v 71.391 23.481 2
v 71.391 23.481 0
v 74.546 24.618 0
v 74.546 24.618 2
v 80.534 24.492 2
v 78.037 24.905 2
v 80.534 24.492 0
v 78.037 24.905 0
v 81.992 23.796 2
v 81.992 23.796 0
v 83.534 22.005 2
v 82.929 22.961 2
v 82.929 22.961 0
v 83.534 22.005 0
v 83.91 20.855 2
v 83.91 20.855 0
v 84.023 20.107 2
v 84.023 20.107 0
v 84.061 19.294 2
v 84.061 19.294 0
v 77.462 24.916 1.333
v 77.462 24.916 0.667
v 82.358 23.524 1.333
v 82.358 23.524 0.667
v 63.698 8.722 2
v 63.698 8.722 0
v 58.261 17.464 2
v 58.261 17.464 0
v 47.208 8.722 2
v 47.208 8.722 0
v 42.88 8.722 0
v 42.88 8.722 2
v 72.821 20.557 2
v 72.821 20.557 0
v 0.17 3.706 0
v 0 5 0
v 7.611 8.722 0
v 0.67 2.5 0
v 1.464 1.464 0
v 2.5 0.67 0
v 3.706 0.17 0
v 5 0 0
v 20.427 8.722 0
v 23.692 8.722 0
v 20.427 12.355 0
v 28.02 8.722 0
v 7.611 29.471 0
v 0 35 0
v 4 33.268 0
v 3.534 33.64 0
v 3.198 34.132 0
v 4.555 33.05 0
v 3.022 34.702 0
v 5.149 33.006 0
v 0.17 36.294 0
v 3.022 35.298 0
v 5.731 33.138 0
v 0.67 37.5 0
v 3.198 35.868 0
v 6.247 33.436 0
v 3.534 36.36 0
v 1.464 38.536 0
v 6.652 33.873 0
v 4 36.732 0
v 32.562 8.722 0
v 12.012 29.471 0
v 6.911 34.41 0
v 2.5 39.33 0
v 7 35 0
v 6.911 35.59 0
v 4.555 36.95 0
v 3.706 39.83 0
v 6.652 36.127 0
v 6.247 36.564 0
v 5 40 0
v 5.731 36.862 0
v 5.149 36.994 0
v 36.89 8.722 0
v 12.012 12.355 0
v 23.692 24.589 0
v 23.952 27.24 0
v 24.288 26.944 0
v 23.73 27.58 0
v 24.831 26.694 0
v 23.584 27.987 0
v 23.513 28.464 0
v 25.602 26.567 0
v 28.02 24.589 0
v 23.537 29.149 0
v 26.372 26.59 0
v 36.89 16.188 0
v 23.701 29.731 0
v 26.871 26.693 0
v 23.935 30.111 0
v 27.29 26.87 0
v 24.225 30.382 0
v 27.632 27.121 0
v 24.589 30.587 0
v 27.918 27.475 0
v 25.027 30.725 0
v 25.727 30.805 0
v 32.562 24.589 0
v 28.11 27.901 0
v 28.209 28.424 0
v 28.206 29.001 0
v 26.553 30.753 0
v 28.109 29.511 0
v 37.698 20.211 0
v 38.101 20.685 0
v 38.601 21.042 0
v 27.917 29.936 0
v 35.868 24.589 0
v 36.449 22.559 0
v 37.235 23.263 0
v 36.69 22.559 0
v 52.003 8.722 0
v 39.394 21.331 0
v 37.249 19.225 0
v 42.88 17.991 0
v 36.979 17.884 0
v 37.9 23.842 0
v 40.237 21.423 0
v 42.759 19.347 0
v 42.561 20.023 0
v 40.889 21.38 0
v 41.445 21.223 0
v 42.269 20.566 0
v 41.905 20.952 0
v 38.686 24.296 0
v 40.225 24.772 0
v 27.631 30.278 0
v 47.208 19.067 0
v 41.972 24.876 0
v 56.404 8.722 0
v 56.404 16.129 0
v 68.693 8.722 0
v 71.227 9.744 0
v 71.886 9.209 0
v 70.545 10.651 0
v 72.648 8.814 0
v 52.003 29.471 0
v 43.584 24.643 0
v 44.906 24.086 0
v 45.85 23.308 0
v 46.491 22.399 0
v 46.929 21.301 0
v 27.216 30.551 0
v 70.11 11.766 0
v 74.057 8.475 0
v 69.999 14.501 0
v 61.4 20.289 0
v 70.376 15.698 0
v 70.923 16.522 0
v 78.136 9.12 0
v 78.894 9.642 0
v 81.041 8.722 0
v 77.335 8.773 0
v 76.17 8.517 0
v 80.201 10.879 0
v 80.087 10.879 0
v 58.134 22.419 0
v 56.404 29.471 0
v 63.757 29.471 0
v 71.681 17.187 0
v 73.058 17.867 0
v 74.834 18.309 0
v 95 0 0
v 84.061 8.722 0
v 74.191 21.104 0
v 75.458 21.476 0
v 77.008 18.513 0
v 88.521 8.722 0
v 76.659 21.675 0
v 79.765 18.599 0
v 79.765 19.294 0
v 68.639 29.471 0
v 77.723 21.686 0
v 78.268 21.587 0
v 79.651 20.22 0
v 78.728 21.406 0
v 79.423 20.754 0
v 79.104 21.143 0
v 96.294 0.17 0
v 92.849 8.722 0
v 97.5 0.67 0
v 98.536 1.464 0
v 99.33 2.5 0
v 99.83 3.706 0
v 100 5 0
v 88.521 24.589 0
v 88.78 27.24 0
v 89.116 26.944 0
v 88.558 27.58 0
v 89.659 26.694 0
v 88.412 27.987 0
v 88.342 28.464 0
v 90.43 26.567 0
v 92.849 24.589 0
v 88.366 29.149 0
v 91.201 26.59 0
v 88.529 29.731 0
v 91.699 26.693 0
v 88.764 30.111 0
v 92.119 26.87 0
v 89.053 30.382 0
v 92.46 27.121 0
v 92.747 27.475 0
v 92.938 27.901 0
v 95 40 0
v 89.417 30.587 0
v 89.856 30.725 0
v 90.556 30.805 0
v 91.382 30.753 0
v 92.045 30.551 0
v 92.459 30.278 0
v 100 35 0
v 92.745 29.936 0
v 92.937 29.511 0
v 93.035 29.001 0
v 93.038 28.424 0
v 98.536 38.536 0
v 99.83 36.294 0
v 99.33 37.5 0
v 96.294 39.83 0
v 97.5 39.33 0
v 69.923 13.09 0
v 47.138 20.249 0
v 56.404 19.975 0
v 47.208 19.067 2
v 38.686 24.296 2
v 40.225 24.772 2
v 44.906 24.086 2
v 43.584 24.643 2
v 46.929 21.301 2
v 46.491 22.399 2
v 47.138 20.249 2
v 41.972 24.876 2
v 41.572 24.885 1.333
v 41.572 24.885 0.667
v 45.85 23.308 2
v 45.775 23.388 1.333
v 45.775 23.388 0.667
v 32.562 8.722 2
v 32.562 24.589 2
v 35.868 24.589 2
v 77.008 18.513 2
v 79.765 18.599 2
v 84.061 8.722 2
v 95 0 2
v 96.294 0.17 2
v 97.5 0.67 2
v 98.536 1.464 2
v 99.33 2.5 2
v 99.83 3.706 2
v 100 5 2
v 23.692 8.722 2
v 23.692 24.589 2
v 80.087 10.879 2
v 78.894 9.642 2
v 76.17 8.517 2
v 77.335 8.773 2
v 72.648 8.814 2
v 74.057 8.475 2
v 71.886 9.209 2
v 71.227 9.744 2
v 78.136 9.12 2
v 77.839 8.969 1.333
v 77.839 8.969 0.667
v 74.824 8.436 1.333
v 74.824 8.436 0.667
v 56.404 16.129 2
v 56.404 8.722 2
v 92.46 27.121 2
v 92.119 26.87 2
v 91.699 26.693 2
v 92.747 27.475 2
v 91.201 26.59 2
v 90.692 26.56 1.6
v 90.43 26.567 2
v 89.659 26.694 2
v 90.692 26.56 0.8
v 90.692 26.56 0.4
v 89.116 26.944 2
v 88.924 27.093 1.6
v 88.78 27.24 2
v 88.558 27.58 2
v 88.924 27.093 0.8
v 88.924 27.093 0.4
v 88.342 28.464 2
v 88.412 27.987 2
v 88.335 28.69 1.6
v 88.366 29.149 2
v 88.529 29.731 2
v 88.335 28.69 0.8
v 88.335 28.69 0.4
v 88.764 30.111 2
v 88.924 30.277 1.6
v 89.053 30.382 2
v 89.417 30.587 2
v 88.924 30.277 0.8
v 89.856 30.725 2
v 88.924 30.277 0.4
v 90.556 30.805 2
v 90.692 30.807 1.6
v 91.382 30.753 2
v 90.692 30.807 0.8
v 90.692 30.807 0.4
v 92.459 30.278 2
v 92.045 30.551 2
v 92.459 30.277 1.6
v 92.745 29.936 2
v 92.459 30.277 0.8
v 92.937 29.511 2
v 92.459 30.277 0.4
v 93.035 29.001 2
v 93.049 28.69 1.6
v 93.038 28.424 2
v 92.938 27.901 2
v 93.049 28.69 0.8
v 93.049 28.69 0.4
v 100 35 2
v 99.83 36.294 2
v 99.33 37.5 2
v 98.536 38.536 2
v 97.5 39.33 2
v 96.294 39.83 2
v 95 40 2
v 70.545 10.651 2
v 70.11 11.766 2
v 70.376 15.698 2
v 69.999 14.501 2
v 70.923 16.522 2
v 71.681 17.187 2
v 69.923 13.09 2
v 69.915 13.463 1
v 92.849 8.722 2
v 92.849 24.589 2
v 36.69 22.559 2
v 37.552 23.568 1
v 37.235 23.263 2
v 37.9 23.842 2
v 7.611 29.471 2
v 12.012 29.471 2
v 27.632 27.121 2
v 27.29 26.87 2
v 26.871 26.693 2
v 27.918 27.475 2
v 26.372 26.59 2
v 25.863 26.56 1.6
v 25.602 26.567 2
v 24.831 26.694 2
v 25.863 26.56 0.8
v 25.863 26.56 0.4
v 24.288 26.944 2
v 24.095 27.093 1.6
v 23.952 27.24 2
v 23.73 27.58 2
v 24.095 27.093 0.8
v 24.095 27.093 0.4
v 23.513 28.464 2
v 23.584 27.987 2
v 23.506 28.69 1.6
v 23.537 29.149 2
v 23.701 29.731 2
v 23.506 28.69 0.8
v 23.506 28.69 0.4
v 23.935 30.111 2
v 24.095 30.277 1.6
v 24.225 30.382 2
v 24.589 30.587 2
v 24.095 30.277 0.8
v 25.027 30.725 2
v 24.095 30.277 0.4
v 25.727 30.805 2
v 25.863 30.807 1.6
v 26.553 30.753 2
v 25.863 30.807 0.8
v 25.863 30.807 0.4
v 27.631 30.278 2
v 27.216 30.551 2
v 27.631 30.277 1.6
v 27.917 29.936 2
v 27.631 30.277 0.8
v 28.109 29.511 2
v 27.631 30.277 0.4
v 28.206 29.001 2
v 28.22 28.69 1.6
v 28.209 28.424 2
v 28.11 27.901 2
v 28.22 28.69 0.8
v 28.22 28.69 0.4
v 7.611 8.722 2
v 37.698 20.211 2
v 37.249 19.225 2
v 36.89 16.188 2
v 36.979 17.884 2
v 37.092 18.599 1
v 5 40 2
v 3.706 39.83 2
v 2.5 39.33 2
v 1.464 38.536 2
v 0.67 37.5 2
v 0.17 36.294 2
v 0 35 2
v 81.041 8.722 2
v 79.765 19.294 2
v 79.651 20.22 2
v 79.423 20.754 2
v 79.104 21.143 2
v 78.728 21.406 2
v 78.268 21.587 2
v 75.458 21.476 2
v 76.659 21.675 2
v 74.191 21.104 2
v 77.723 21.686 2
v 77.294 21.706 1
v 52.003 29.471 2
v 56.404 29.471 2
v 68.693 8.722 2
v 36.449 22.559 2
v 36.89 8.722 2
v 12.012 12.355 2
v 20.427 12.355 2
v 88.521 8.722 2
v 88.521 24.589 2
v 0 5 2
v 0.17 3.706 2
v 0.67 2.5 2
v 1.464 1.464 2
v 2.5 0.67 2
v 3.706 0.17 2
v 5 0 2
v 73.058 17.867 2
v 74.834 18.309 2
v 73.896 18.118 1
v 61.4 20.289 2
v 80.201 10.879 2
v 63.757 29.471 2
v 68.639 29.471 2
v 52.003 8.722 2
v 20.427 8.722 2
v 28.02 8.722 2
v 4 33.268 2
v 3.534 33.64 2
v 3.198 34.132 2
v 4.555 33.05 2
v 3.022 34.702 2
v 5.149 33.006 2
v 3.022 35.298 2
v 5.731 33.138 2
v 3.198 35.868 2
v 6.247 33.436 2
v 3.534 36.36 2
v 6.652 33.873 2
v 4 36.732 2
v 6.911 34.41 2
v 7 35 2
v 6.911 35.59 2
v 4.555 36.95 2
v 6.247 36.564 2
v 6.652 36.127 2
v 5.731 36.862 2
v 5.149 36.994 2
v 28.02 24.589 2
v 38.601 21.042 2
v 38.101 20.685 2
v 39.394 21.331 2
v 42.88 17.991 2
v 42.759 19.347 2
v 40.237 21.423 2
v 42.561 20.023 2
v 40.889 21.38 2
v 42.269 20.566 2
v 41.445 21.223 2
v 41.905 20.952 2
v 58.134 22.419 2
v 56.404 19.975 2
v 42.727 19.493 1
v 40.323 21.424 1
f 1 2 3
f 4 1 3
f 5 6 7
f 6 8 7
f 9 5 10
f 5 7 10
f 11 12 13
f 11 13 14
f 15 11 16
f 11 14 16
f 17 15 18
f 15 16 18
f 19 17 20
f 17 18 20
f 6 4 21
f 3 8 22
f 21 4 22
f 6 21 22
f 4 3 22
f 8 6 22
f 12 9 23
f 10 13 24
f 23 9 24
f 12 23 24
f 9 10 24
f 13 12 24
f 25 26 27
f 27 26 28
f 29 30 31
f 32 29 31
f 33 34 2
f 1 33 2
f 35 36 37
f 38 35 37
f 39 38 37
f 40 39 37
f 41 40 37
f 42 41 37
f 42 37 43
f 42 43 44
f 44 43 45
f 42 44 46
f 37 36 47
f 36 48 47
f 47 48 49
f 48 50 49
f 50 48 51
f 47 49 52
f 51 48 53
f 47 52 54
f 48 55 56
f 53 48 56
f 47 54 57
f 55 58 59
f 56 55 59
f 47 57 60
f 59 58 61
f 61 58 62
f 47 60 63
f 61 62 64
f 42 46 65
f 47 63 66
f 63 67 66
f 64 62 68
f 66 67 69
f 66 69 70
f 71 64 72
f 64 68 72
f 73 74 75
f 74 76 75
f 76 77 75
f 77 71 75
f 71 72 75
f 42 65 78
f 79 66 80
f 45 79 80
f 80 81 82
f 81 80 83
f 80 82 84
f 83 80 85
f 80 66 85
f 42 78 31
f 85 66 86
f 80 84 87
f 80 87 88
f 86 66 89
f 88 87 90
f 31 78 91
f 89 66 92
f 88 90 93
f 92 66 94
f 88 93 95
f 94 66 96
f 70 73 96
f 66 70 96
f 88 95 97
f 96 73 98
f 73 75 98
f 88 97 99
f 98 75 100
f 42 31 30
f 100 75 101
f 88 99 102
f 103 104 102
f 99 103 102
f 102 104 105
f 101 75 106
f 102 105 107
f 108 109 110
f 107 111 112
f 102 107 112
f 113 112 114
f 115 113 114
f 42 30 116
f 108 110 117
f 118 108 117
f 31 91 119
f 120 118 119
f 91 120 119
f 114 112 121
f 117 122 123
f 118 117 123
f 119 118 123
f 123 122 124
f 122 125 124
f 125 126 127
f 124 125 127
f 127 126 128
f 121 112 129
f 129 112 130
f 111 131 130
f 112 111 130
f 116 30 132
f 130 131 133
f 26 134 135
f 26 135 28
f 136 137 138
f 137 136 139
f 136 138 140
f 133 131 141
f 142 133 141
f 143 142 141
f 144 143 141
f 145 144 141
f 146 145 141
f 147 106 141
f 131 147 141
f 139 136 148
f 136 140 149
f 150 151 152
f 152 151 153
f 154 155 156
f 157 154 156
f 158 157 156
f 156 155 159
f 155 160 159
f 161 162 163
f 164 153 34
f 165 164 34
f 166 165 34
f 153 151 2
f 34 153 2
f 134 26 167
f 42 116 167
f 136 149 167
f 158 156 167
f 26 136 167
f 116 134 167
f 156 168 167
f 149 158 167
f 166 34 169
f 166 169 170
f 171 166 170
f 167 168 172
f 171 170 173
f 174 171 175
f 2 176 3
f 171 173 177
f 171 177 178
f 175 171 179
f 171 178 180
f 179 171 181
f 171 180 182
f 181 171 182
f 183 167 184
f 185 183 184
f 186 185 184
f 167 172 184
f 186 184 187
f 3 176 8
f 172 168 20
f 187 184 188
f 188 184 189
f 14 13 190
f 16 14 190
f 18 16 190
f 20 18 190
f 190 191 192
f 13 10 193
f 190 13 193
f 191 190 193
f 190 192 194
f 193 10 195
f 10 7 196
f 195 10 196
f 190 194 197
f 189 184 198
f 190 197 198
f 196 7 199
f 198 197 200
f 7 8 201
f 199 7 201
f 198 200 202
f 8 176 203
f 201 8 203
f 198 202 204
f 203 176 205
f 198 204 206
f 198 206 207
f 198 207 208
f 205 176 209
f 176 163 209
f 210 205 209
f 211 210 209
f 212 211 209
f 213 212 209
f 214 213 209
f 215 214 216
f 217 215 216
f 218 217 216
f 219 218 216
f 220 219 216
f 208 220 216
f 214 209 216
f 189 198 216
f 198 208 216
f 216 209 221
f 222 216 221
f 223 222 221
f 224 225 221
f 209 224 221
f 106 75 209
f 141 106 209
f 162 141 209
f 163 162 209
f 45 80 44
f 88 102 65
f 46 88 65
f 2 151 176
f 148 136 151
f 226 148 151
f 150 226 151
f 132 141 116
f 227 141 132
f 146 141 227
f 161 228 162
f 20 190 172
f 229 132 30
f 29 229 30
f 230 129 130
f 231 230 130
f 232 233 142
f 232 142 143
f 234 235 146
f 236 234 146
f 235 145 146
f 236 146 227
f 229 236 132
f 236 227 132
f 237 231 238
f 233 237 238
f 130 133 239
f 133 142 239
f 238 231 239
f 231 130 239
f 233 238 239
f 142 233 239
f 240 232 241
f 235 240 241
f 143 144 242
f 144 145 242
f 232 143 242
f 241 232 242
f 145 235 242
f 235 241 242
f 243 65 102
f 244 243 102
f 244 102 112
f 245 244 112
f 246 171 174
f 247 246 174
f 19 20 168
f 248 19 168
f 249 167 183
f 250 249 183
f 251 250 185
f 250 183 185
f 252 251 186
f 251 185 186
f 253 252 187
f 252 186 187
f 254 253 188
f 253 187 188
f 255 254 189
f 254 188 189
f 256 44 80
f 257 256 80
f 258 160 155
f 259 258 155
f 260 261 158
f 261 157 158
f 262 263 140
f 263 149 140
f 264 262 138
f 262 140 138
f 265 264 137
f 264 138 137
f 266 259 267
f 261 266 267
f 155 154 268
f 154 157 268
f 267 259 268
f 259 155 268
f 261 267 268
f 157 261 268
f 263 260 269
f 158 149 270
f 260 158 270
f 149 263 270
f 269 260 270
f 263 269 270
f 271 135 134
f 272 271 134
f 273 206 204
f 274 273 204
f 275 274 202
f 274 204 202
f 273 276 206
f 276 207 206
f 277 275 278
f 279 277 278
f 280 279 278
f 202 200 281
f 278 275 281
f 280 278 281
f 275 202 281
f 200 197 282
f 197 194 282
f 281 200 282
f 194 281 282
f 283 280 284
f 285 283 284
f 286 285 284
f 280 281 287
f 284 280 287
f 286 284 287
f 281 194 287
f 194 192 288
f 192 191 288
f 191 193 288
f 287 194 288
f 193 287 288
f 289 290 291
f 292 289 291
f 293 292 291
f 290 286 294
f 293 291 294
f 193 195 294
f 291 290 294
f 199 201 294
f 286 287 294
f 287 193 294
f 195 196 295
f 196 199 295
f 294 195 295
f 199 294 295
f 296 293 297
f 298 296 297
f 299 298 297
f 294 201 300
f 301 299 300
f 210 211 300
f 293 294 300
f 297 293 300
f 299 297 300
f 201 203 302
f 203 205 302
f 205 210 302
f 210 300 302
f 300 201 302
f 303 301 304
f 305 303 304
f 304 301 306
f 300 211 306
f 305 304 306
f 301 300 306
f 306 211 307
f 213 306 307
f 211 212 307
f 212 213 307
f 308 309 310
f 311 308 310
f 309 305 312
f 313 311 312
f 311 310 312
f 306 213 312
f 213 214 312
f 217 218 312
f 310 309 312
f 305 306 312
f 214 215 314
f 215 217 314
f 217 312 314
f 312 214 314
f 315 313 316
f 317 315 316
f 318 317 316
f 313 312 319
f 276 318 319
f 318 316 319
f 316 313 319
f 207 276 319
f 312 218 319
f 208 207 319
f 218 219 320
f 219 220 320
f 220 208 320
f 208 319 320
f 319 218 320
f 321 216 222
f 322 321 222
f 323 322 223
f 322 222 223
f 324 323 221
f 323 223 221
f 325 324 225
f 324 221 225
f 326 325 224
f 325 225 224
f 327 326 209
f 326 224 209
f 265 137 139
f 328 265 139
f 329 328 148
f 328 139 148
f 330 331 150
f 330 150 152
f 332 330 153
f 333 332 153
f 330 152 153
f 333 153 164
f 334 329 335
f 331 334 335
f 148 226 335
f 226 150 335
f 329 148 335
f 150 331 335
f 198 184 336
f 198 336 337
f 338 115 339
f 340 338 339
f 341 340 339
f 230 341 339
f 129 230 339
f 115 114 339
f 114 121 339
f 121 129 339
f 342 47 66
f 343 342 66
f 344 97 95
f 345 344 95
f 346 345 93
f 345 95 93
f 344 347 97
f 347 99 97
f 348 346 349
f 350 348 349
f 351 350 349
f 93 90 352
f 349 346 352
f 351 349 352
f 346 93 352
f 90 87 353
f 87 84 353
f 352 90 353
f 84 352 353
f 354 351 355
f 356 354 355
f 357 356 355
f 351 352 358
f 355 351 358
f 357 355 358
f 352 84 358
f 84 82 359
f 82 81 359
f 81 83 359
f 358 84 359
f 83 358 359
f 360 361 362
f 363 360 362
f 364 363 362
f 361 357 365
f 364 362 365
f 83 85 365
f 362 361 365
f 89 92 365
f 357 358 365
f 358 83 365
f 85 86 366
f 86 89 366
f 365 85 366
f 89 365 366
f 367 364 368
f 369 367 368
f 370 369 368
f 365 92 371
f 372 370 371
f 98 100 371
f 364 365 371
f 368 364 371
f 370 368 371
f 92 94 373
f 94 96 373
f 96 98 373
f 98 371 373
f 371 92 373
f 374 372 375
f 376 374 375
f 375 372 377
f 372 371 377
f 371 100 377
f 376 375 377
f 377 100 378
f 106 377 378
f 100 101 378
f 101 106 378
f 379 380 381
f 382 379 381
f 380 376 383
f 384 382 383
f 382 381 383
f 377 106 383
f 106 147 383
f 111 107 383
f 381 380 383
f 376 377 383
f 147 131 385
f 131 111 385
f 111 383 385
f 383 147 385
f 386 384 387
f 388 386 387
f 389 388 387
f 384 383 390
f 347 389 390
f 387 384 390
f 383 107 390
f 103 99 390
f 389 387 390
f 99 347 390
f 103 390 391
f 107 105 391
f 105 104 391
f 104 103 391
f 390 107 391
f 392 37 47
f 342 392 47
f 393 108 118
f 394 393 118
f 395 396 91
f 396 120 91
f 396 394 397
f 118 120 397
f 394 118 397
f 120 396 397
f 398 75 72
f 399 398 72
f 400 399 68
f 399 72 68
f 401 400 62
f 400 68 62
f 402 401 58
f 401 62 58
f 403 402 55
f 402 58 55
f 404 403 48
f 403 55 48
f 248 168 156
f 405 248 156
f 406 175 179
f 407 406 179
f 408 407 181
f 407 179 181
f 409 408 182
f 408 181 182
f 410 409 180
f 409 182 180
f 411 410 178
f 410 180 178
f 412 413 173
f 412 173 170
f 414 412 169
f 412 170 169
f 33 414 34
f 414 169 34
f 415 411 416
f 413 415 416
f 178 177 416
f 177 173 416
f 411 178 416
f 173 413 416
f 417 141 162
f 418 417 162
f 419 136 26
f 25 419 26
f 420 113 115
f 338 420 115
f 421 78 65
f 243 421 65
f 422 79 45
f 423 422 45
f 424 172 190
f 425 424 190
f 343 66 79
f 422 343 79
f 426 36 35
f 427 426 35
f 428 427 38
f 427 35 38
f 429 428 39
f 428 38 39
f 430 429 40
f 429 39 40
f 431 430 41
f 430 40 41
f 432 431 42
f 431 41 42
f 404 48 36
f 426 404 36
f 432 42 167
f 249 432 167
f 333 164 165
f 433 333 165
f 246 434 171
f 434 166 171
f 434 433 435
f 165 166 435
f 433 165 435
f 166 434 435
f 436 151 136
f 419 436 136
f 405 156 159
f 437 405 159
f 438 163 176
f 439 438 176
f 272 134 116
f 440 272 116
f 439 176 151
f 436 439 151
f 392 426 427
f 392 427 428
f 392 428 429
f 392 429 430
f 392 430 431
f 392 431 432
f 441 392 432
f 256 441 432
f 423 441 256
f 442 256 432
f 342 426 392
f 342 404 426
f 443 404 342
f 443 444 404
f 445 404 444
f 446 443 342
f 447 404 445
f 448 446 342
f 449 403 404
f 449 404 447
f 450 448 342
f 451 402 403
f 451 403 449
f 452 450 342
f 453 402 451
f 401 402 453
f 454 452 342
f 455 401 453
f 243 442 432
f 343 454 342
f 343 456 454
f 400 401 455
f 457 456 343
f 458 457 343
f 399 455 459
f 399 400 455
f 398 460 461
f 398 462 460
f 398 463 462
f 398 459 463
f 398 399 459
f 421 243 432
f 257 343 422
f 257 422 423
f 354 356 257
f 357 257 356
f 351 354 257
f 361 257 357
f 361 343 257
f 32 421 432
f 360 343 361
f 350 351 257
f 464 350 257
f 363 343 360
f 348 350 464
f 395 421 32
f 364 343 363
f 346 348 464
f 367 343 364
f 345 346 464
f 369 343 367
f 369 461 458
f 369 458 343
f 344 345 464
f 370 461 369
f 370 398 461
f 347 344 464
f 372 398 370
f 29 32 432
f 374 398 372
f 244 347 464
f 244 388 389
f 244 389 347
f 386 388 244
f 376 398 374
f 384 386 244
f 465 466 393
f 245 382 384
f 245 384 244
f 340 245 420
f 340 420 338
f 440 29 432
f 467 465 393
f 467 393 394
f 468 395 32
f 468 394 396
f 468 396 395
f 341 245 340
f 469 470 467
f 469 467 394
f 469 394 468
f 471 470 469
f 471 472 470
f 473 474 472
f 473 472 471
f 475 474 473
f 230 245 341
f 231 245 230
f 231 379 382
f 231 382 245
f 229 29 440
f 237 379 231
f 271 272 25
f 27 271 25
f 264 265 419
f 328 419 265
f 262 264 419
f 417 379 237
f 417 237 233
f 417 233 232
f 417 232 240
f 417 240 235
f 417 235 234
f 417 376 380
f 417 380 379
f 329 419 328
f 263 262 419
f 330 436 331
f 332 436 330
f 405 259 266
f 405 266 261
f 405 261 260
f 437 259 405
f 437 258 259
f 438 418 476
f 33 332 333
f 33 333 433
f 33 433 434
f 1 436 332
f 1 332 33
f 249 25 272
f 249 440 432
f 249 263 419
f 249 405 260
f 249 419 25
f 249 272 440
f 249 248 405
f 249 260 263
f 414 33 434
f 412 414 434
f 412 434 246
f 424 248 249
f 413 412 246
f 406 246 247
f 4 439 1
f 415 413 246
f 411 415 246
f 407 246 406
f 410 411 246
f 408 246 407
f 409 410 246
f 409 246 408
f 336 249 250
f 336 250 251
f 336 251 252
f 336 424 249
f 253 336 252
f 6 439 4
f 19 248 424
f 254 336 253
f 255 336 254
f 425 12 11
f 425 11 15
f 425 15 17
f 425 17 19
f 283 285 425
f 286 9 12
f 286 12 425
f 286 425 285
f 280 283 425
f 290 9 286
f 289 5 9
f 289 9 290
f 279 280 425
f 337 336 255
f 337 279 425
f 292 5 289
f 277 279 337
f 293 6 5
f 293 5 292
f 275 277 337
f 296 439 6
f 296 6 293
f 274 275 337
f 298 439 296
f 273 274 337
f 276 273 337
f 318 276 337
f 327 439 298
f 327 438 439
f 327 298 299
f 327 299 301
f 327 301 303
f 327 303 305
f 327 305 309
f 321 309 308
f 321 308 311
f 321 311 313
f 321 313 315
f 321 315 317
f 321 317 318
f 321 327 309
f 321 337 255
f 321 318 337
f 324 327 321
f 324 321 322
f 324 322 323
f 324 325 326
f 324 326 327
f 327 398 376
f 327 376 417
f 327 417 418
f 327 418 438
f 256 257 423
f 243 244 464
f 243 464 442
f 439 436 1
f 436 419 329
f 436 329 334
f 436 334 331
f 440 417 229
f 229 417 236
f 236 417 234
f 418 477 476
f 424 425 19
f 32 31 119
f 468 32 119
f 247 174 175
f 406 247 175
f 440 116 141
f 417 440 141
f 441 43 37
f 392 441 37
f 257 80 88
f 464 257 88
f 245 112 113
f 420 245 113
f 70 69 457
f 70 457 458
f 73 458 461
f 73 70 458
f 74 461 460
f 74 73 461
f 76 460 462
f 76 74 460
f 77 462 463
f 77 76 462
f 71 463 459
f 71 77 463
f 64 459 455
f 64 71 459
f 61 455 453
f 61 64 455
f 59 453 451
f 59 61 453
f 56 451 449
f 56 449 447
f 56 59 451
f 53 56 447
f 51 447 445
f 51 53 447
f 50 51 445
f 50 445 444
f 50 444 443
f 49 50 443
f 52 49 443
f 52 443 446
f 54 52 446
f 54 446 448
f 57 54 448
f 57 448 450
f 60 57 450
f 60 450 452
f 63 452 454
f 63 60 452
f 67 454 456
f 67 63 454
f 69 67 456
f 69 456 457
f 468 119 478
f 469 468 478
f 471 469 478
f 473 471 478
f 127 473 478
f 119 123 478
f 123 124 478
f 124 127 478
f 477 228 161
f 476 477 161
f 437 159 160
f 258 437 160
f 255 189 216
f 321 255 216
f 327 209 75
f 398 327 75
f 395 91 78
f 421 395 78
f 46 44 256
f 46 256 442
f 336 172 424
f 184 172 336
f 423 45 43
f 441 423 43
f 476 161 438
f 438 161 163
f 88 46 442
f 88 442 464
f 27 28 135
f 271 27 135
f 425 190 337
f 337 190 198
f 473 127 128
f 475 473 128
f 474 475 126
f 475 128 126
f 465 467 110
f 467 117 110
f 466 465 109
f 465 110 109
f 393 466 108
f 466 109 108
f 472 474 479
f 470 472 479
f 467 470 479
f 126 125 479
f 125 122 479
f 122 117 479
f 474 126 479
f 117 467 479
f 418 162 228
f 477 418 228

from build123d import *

# Parameters (mm, degrees)
F0_W     = 4.3279479289
F0_H     = 15.8676286083
F0_R     = 2
F1_DEPTH = 2


with BuildPart() as f1:
    # F0 (on Top) → F1 (new body)
    with BuildSketch(Plane.XY):
        with BuildLine():
            ThreePointArc((0, 5), (1.4644660941, 1.4644660941), (5, 0))
            Line((5, 0), (95, 0))
            ThreePointArc((95, 0), (98.5355339059, 1.4644660941), (100, 5))
            Line((100, 5), (100, 35))
            ThreePointArc((100, 35), (98.5355339059, 38.5355339059), (95, 40))
            Line((95, 40), (5, 40))
            ThreePointArc((5, 40), (1.4644660941, 38.5355339059), (0, 35))
            Line((0, 35), (0, 5))
        make_face()
        Polygon((20.4271134466, 8.7217205013), (7.6113012163, 8.7217205013), (7.6113012163, 29.4713470357), (12.0119114399, 29.4713470357), (12.0119114399, 12.3548352371), (20.4271134466, 12.3548352371), align=None, mode=Mode.SUBTRACT)
        with Locations((25.8563492798, 16.6555348055)):
            Rectangle(F0_W, F0_H, mode=Mode.SUBTRACT)
        with BuildLine():
            Line((47.2077104423, 19.0670147113), (47.2077104423, 8.7217205013))
            Line((47.2077104423, 8.7217205013), (42.8797625133, 8.7217205013))
            Line((42.8797625133, 8.7217205013), (42.8797625133, 17.9907044709))
            add(Edge.make_bspline(
                [(42.8797625133, 17.9907044709), (42.8797625133, 19.7073511835), (42.2689450984, 20.5656745398)],
                knots=[0, 0, 0, 1, 1, 1], degree=2))
            add(Edge.make_bspline(
                [(42.2689450984, 20.5656745398), (41.6581276834, 21.4239978961), (40.3229580181, 21.4239978961)],
                knots=[0, 0, 0, 1, 1, 1], degree=2))
            add(Edge.make_bspline(
                [(40.3229580181, 21.4239978961), (38.5064006502, 21.4239978961), (37.6980326215, 20.2114458531)],
                knots=[0, 0, 0, 1, 1, 1], degree=2))
            add(Edge.make_bspline(
                [(37.6980326215, 20.2114458531), (36.8896645928, 18.99889381), (36.8896645928, 16.1877712833)],
                knots=[0, 0, 0, 1, 1, 1], degree=2))
            Line((36.8896645928, 16.1877712833), (36.8896645928, 8.7217205013))
            Line((36.8896645928, 8.7217205013), (32.5617166639, 8.7217205013))
            Line((32.5617166639, 8.7217205013), (32.5617166639, 24.5893491096))
            Line((32.5617166639, 24.5893491096), (35.8678510734, 24.5893491096))
            Line((35.8678510734, 24.5893491096), (36.4491494311, 22.559346251))
            Line((36.4491494311, 22.559346251), (36.6898432823, 22.559346251))
            add(Edge.make_bspline(
                [(36.6898432823, 22.559346251), (37.4164662295, 23.7083187862), (38.6857856903, 24.296429234)],
                knots=[0, 0, 0, 1, 1, 1], degree=2))
            add(Edge.make_bspline(
                [(38.6857856903, 24.296429234), (39.9551051511, 24.8845396819), (41.5718412085, 24.8845396819)],
                knots=[0, 0, 0, 1, 1, 1], degree=2))
            add(Edge.make_bspline(
                [(41.5718412085, 24.8845396819), (44.3420911945, 24.8845396819), (45.7749008184, 23.3881505501)],
                knots=[0, 0, 0, 1, 1, 1], degree=2))
            add(Edge.make_bspline(
                [(45.7749008184, 23.3881505501), (47.2077104423, 21.8917614183), (47.2077104423, 19.0670147113)],
                knots=[0, 0, 0, 1, 1, 1], degree=2))
        make_face(mode=Mode.SUBTRACT)
        Polygon((61.3995648787, 20.2886495412), (68.6930427106, 8.7217205013), (63.697509949, 8.7217205013), (58.2614620257, 17.4639028342), (56.4040321171, 16.1287331688), (56.4040321171, 8.7217205013), (52.0034218934, 8.7217205013), (52.0034218934, 29.4713470357), (56.4040321171, 29.4713470357), (56.4040321171, 19.9752933952), (58.1343030099, 22.418563055), (63.7565480635, 29.4713470357), (68.6385459896, 29.4713470357), align=None, mode=Mode.SUBTRACT)
        with BuildLine():
            Line((84.0611180428, 8.7217205013), (81.0410914187, 8.7217205013))
            Line((81.0410914187, 8.7217205013), (80.200933636, 10.8788823757))
            Line((80.200933636, 10.8788823757), (80.0873988006, 10.8788823757))
            add(Edge.make_bspline(
                [(80.0873988006, 10.8788823757), (78.9974643798, 9.5028401695), (77.8394090578, 8.9692264427)],
                knots=[0, 0, 0, 1, 1, 1], degree=2))
            add(Edge.make_bspline(
                [(77.8394090578, 8.9692264427), (76.6813537358, 8.4356127159), (74.8239238272, 8.4356127159)],
                knots=[0, 0, 0, 1, 1, 1], degree=2))
            add(Edge.make_bspline(
                [(74.8239238272, 8.4356127159), (72.5396029371, 8.4356127159), (71.2271402388, 9.7435340208)],
                knots=[0, 0, 0, 1, 1, 1], degree=2))
            add(Edge.make_bspline(
                [(71.2271402388, 9.7435340208), (69.9146775405, 11.0514553256), (69.9146775405, 13.4629352315)],
                knots=[0, 0, 0, 1, 1, 1], degree=2))
            add(Edge.make_bspline(
                [(69.9146775405, 13.4629352315), (69.9146775405, 15.9879499728), (71.6812795808, 17.1868778356)],
                knots=[0, 0, 0, 1, 1, 1], degree=2))
            add(Edge.make_bspline(
                [(71.6812795808, 17.1868778356), (73.447881621, 18.3858056984), (77.008334062, 18.5129647141)],
                knots=[0, 0, 0, 1, 1, 1], degree=2))
            Line((77.008334062, 18.5129647141), (79.7649598678, 18.5992511891))
            Line((79.7649598678, 18.5992511891), (79.7649598678, 19.2940843823))
            add(Edge.make_bspline(
                [(79.7649598678, 19.2940843823), (79.7649598678, 21.7055642881), (77.2944418475, 21.7055642881)],
                knots=[0, 0, 0, 1, 1, 1], degree=2))
            add(Edge.make_bspline(
                [(77.2944418475, 21.7055642881), (75.3915980046, 21.7055642881), (72.8211693291, 20.556591753)],
                knots=[0, 0, 0, 1, 1, 1], degree=2))
            Line((72.8211693291, 20.556591753), (71.3906304019, 23.4812491152))
            add(Edge.make_bspline(
                [(71.3906304019, 23.4812491152), (74.129090634, 24.9163294358), (77.462473404, 24.9163294358)],
                knots=[0, 0, 0, 1, 1, 1], degree=2))
            add(Edge.make_bspline(
                [(77.462473404, 24.9163294358), (80.655072978, 24.9163294358), (82.3580955104, 23.5243923527)],
                knots=[0, 0, 0, 1, 1, 1], degree=2))
            add(Edge.make_bspline(
                [(82.3580955104, 23.5243923527), (84.0611180428, 22.1324552696), (84.0611180428, 19.2940843823)],
                knots=[0, 0, 0, 1, 1, 1], degree=2))
            Line((84.0611180428, 19.2940843823), (84.0611180428, 8.7217205013))
        make_face(mode=Mode.SUBTRACT)
        with Locations((90.6847403453, 16.6555348055)):
            Rectangle(F0_W, F0_H, mode=Mode.SUBTRACT)
        with BuildLine():
            add(Edge.make_bspline(
                [(25.8631613699, 26.5603138537), (23.5061781851, 26.5603138537), (23.5061781851, 28.6902273676)],
                knots=[0, 0, 0, 1, 1, 1], degree=2))
            add(Edge.make_bspline(
                [(23.5061781851, 28.6902273676), (23.5061781851, 30.8065167011), (25.8631613699, 30.8065167011)],
                knots=[0, 0, 0, 1, 1, 1], degree=2))
            add(Edge.make_bspline(
                [(25.8631613699, 30.8065167011), (28.2201445547, 30.8065167011), (28.2201445547, 28.6902273676)],
                knots=[0, 0, 0, 1, 1, 1], degree=2))
            add(Edge.make_bspline(
                [(28.2201445547, 28.6902273676), (28.2201445547, 27.6820380284), (27.6320341068, 27.1211759411)],
                knots=[0, 0, 0, 1, 1, 1], degree=2))
            add(Edge.make_bspline(
                [(27.6320341068, 27.1211759411), (27.043923659, 26.5603138537), (25.8631613699, 26.5603138537)],
                knots=[0, 0, 0, 1, 1, 1], degree=2))
        make_face(mode=Mode.SUBTRACT)
        with Locations((5, 35)):
            Circle(F0_R, mode=Mode.SUBTRACT)
        with BuildLine():
            add(Edge.make_bspline(
                [(90.6915524354, 26.5603138537), (88.3345692506, 26.5603138537), (88.3345692506, 28.6902273676)],
                knots=[0, 0, 0, 1, 1, 1], degree=2))
            add(Edge.make_bspline(
                [(88.3345692506, 28.6902273676), (88.3345692506, 30.8065167011), (90.6915524354, 30.8065167011)],
                knots=[0, 0, 0, 1, 1, 1], degree=2))
            add(Edge.make_bspline(
                [(90.6915524354, 30.8065167011), (93.0485356202, 30.8065167011), (93.0485356202, 28.6902273676)],
                knots=[0, 0, 0, 1, 1, 1], degree=2))
            add(Edge.make_bspline(
                [(93.0485356202, 28.6902273676), (93.0485356202, 27.6820380284), (92.4604251724, 27.1211759411)],
                knots=[0, 0, 0, 1, 1, 1], degree=2))
            add(Edge.make_bspline(
                [(92.4604251724, 27.1211759411), (91.8723147246, 26.5603138537), (90.6915524354, 26.5603138537)],
                knots=[0, 0, 0, 1, 1, 1], degree=2))
        make_face(mode=Mode.SUBTRACT)
    extrude(amount=F1_DEPTH)


solid = f1.part
